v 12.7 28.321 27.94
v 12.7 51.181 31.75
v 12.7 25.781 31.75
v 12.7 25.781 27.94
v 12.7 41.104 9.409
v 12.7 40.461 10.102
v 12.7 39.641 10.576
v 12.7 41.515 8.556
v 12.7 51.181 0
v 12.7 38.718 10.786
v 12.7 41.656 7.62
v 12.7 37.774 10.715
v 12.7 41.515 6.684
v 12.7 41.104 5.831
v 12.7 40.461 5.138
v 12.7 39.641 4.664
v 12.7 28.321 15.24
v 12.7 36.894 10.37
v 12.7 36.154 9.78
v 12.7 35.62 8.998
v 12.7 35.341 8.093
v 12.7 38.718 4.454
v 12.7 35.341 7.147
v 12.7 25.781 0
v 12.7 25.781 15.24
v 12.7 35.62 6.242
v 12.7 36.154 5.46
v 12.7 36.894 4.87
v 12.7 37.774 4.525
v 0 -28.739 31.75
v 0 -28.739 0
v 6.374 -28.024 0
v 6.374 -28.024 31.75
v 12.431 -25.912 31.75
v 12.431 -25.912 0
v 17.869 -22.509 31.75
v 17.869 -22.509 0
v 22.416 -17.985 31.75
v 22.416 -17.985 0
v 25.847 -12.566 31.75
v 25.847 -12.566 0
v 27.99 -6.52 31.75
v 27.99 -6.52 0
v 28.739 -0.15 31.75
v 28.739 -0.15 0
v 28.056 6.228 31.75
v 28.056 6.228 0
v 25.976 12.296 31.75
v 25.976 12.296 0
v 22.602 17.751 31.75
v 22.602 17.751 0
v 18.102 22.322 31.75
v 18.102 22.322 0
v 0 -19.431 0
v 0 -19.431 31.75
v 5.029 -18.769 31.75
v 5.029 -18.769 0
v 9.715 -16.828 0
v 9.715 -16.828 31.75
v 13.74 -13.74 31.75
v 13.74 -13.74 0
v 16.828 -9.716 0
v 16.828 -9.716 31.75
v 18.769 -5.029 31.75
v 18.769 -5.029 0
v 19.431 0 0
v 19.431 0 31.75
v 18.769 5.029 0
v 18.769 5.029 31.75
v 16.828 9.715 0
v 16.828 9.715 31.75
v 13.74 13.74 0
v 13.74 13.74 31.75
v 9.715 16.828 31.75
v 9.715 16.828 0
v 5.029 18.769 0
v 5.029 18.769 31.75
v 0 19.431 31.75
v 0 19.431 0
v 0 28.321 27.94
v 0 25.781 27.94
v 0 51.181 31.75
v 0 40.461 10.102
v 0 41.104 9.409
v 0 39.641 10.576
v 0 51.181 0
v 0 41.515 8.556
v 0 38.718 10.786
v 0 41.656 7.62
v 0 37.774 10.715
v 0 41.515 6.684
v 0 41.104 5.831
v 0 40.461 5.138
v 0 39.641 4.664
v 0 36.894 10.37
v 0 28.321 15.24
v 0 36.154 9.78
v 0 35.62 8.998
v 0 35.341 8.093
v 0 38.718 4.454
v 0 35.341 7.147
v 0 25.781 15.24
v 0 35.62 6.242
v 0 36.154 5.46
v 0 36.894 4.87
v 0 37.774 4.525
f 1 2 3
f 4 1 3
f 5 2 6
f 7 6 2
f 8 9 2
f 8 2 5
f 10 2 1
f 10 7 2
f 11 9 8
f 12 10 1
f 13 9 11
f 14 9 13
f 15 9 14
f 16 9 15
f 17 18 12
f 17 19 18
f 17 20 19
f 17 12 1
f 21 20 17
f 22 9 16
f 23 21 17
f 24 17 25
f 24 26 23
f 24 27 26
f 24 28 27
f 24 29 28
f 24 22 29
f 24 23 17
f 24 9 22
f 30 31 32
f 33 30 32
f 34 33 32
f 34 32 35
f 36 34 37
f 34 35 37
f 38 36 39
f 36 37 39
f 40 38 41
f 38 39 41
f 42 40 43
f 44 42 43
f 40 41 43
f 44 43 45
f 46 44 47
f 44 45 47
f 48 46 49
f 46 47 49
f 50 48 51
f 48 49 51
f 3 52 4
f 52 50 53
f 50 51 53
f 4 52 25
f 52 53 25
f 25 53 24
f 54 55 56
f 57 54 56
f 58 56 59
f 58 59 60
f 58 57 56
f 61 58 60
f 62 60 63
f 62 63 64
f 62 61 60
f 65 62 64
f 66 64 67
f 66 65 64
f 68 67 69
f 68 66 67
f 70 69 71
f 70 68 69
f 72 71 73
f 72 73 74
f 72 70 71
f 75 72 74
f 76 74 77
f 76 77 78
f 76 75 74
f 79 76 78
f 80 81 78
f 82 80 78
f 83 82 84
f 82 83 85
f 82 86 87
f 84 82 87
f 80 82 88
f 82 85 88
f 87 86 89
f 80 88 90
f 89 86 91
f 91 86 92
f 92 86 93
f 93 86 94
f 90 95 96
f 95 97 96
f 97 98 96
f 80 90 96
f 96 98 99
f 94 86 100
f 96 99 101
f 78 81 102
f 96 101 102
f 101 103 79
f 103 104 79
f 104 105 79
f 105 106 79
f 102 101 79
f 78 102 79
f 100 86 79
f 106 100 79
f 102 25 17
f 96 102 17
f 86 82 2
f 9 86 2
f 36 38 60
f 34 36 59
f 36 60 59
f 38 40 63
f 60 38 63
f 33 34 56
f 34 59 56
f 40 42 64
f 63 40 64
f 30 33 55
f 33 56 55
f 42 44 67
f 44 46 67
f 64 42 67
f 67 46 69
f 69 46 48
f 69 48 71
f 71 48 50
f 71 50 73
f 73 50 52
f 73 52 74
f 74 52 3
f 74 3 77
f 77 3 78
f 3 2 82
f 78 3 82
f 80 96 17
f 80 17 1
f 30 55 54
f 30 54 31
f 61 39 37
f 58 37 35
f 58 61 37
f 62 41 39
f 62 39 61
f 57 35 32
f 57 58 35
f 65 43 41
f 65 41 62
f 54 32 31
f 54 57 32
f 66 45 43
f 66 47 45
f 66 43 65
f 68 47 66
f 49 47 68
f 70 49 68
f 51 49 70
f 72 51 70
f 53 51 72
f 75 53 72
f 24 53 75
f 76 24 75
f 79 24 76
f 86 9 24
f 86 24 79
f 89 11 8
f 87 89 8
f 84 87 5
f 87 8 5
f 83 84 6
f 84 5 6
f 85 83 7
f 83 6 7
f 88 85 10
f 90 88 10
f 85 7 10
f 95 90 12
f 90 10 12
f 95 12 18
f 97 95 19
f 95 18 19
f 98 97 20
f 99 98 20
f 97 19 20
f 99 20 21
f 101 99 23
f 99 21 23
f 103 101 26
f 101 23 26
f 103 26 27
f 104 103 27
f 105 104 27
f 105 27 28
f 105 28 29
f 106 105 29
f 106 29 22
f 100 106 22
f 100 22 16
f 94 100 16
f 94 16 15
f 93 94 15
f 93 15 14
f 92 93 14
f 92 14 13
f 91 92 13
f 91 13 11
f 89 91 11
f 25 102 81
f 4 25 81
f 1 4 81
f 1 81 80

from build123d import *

# Parameters (mm, degrees)
PAD_DEPTH    = 31.75
SKETCH001_R  = 3.175
SKETCH001_W  = 2.54
SKETCH001_H  = 12.7
POCKET_DEPTH = 12.701


with BuildPart() as part:
    # Sketch → Pad (new body)
    with BuildSketch(Plane.XY):
        with BuildLine():
            Line((0, 51.181), (12.7, 51.181))
            Line((12.7, 51.181), (12.7, 25.781))
            ThreePointArc((0, -28.739345), (27.989989, -6.520004), (12.7, 25.781))
            Line((0, -19.431), (0, -28.739345))
            ThreePointArc((0, -19.431), (19.431, 0), (0, 19.431))
            Line((0, 51.181), (0, 19.431))
        make_face()
    extrude(amount=PAD_DEPTH)

    # Sketch001 (on Face2 of Pad) → Pocket (cut, through all)
    with BuildSketch(Plane.YZ.offset(12.7)):
        with Locations((38.481, 7.62)):
            Circle(SKETCH001_R)
        with Locations((27.051, 21.59)):
            Rectangle(SKETCH001_W, SKETCH001_H)
    extrude(amount=-POCKET_DEPTH, mode=Mode.SUBTRACT)


solid = part.part
